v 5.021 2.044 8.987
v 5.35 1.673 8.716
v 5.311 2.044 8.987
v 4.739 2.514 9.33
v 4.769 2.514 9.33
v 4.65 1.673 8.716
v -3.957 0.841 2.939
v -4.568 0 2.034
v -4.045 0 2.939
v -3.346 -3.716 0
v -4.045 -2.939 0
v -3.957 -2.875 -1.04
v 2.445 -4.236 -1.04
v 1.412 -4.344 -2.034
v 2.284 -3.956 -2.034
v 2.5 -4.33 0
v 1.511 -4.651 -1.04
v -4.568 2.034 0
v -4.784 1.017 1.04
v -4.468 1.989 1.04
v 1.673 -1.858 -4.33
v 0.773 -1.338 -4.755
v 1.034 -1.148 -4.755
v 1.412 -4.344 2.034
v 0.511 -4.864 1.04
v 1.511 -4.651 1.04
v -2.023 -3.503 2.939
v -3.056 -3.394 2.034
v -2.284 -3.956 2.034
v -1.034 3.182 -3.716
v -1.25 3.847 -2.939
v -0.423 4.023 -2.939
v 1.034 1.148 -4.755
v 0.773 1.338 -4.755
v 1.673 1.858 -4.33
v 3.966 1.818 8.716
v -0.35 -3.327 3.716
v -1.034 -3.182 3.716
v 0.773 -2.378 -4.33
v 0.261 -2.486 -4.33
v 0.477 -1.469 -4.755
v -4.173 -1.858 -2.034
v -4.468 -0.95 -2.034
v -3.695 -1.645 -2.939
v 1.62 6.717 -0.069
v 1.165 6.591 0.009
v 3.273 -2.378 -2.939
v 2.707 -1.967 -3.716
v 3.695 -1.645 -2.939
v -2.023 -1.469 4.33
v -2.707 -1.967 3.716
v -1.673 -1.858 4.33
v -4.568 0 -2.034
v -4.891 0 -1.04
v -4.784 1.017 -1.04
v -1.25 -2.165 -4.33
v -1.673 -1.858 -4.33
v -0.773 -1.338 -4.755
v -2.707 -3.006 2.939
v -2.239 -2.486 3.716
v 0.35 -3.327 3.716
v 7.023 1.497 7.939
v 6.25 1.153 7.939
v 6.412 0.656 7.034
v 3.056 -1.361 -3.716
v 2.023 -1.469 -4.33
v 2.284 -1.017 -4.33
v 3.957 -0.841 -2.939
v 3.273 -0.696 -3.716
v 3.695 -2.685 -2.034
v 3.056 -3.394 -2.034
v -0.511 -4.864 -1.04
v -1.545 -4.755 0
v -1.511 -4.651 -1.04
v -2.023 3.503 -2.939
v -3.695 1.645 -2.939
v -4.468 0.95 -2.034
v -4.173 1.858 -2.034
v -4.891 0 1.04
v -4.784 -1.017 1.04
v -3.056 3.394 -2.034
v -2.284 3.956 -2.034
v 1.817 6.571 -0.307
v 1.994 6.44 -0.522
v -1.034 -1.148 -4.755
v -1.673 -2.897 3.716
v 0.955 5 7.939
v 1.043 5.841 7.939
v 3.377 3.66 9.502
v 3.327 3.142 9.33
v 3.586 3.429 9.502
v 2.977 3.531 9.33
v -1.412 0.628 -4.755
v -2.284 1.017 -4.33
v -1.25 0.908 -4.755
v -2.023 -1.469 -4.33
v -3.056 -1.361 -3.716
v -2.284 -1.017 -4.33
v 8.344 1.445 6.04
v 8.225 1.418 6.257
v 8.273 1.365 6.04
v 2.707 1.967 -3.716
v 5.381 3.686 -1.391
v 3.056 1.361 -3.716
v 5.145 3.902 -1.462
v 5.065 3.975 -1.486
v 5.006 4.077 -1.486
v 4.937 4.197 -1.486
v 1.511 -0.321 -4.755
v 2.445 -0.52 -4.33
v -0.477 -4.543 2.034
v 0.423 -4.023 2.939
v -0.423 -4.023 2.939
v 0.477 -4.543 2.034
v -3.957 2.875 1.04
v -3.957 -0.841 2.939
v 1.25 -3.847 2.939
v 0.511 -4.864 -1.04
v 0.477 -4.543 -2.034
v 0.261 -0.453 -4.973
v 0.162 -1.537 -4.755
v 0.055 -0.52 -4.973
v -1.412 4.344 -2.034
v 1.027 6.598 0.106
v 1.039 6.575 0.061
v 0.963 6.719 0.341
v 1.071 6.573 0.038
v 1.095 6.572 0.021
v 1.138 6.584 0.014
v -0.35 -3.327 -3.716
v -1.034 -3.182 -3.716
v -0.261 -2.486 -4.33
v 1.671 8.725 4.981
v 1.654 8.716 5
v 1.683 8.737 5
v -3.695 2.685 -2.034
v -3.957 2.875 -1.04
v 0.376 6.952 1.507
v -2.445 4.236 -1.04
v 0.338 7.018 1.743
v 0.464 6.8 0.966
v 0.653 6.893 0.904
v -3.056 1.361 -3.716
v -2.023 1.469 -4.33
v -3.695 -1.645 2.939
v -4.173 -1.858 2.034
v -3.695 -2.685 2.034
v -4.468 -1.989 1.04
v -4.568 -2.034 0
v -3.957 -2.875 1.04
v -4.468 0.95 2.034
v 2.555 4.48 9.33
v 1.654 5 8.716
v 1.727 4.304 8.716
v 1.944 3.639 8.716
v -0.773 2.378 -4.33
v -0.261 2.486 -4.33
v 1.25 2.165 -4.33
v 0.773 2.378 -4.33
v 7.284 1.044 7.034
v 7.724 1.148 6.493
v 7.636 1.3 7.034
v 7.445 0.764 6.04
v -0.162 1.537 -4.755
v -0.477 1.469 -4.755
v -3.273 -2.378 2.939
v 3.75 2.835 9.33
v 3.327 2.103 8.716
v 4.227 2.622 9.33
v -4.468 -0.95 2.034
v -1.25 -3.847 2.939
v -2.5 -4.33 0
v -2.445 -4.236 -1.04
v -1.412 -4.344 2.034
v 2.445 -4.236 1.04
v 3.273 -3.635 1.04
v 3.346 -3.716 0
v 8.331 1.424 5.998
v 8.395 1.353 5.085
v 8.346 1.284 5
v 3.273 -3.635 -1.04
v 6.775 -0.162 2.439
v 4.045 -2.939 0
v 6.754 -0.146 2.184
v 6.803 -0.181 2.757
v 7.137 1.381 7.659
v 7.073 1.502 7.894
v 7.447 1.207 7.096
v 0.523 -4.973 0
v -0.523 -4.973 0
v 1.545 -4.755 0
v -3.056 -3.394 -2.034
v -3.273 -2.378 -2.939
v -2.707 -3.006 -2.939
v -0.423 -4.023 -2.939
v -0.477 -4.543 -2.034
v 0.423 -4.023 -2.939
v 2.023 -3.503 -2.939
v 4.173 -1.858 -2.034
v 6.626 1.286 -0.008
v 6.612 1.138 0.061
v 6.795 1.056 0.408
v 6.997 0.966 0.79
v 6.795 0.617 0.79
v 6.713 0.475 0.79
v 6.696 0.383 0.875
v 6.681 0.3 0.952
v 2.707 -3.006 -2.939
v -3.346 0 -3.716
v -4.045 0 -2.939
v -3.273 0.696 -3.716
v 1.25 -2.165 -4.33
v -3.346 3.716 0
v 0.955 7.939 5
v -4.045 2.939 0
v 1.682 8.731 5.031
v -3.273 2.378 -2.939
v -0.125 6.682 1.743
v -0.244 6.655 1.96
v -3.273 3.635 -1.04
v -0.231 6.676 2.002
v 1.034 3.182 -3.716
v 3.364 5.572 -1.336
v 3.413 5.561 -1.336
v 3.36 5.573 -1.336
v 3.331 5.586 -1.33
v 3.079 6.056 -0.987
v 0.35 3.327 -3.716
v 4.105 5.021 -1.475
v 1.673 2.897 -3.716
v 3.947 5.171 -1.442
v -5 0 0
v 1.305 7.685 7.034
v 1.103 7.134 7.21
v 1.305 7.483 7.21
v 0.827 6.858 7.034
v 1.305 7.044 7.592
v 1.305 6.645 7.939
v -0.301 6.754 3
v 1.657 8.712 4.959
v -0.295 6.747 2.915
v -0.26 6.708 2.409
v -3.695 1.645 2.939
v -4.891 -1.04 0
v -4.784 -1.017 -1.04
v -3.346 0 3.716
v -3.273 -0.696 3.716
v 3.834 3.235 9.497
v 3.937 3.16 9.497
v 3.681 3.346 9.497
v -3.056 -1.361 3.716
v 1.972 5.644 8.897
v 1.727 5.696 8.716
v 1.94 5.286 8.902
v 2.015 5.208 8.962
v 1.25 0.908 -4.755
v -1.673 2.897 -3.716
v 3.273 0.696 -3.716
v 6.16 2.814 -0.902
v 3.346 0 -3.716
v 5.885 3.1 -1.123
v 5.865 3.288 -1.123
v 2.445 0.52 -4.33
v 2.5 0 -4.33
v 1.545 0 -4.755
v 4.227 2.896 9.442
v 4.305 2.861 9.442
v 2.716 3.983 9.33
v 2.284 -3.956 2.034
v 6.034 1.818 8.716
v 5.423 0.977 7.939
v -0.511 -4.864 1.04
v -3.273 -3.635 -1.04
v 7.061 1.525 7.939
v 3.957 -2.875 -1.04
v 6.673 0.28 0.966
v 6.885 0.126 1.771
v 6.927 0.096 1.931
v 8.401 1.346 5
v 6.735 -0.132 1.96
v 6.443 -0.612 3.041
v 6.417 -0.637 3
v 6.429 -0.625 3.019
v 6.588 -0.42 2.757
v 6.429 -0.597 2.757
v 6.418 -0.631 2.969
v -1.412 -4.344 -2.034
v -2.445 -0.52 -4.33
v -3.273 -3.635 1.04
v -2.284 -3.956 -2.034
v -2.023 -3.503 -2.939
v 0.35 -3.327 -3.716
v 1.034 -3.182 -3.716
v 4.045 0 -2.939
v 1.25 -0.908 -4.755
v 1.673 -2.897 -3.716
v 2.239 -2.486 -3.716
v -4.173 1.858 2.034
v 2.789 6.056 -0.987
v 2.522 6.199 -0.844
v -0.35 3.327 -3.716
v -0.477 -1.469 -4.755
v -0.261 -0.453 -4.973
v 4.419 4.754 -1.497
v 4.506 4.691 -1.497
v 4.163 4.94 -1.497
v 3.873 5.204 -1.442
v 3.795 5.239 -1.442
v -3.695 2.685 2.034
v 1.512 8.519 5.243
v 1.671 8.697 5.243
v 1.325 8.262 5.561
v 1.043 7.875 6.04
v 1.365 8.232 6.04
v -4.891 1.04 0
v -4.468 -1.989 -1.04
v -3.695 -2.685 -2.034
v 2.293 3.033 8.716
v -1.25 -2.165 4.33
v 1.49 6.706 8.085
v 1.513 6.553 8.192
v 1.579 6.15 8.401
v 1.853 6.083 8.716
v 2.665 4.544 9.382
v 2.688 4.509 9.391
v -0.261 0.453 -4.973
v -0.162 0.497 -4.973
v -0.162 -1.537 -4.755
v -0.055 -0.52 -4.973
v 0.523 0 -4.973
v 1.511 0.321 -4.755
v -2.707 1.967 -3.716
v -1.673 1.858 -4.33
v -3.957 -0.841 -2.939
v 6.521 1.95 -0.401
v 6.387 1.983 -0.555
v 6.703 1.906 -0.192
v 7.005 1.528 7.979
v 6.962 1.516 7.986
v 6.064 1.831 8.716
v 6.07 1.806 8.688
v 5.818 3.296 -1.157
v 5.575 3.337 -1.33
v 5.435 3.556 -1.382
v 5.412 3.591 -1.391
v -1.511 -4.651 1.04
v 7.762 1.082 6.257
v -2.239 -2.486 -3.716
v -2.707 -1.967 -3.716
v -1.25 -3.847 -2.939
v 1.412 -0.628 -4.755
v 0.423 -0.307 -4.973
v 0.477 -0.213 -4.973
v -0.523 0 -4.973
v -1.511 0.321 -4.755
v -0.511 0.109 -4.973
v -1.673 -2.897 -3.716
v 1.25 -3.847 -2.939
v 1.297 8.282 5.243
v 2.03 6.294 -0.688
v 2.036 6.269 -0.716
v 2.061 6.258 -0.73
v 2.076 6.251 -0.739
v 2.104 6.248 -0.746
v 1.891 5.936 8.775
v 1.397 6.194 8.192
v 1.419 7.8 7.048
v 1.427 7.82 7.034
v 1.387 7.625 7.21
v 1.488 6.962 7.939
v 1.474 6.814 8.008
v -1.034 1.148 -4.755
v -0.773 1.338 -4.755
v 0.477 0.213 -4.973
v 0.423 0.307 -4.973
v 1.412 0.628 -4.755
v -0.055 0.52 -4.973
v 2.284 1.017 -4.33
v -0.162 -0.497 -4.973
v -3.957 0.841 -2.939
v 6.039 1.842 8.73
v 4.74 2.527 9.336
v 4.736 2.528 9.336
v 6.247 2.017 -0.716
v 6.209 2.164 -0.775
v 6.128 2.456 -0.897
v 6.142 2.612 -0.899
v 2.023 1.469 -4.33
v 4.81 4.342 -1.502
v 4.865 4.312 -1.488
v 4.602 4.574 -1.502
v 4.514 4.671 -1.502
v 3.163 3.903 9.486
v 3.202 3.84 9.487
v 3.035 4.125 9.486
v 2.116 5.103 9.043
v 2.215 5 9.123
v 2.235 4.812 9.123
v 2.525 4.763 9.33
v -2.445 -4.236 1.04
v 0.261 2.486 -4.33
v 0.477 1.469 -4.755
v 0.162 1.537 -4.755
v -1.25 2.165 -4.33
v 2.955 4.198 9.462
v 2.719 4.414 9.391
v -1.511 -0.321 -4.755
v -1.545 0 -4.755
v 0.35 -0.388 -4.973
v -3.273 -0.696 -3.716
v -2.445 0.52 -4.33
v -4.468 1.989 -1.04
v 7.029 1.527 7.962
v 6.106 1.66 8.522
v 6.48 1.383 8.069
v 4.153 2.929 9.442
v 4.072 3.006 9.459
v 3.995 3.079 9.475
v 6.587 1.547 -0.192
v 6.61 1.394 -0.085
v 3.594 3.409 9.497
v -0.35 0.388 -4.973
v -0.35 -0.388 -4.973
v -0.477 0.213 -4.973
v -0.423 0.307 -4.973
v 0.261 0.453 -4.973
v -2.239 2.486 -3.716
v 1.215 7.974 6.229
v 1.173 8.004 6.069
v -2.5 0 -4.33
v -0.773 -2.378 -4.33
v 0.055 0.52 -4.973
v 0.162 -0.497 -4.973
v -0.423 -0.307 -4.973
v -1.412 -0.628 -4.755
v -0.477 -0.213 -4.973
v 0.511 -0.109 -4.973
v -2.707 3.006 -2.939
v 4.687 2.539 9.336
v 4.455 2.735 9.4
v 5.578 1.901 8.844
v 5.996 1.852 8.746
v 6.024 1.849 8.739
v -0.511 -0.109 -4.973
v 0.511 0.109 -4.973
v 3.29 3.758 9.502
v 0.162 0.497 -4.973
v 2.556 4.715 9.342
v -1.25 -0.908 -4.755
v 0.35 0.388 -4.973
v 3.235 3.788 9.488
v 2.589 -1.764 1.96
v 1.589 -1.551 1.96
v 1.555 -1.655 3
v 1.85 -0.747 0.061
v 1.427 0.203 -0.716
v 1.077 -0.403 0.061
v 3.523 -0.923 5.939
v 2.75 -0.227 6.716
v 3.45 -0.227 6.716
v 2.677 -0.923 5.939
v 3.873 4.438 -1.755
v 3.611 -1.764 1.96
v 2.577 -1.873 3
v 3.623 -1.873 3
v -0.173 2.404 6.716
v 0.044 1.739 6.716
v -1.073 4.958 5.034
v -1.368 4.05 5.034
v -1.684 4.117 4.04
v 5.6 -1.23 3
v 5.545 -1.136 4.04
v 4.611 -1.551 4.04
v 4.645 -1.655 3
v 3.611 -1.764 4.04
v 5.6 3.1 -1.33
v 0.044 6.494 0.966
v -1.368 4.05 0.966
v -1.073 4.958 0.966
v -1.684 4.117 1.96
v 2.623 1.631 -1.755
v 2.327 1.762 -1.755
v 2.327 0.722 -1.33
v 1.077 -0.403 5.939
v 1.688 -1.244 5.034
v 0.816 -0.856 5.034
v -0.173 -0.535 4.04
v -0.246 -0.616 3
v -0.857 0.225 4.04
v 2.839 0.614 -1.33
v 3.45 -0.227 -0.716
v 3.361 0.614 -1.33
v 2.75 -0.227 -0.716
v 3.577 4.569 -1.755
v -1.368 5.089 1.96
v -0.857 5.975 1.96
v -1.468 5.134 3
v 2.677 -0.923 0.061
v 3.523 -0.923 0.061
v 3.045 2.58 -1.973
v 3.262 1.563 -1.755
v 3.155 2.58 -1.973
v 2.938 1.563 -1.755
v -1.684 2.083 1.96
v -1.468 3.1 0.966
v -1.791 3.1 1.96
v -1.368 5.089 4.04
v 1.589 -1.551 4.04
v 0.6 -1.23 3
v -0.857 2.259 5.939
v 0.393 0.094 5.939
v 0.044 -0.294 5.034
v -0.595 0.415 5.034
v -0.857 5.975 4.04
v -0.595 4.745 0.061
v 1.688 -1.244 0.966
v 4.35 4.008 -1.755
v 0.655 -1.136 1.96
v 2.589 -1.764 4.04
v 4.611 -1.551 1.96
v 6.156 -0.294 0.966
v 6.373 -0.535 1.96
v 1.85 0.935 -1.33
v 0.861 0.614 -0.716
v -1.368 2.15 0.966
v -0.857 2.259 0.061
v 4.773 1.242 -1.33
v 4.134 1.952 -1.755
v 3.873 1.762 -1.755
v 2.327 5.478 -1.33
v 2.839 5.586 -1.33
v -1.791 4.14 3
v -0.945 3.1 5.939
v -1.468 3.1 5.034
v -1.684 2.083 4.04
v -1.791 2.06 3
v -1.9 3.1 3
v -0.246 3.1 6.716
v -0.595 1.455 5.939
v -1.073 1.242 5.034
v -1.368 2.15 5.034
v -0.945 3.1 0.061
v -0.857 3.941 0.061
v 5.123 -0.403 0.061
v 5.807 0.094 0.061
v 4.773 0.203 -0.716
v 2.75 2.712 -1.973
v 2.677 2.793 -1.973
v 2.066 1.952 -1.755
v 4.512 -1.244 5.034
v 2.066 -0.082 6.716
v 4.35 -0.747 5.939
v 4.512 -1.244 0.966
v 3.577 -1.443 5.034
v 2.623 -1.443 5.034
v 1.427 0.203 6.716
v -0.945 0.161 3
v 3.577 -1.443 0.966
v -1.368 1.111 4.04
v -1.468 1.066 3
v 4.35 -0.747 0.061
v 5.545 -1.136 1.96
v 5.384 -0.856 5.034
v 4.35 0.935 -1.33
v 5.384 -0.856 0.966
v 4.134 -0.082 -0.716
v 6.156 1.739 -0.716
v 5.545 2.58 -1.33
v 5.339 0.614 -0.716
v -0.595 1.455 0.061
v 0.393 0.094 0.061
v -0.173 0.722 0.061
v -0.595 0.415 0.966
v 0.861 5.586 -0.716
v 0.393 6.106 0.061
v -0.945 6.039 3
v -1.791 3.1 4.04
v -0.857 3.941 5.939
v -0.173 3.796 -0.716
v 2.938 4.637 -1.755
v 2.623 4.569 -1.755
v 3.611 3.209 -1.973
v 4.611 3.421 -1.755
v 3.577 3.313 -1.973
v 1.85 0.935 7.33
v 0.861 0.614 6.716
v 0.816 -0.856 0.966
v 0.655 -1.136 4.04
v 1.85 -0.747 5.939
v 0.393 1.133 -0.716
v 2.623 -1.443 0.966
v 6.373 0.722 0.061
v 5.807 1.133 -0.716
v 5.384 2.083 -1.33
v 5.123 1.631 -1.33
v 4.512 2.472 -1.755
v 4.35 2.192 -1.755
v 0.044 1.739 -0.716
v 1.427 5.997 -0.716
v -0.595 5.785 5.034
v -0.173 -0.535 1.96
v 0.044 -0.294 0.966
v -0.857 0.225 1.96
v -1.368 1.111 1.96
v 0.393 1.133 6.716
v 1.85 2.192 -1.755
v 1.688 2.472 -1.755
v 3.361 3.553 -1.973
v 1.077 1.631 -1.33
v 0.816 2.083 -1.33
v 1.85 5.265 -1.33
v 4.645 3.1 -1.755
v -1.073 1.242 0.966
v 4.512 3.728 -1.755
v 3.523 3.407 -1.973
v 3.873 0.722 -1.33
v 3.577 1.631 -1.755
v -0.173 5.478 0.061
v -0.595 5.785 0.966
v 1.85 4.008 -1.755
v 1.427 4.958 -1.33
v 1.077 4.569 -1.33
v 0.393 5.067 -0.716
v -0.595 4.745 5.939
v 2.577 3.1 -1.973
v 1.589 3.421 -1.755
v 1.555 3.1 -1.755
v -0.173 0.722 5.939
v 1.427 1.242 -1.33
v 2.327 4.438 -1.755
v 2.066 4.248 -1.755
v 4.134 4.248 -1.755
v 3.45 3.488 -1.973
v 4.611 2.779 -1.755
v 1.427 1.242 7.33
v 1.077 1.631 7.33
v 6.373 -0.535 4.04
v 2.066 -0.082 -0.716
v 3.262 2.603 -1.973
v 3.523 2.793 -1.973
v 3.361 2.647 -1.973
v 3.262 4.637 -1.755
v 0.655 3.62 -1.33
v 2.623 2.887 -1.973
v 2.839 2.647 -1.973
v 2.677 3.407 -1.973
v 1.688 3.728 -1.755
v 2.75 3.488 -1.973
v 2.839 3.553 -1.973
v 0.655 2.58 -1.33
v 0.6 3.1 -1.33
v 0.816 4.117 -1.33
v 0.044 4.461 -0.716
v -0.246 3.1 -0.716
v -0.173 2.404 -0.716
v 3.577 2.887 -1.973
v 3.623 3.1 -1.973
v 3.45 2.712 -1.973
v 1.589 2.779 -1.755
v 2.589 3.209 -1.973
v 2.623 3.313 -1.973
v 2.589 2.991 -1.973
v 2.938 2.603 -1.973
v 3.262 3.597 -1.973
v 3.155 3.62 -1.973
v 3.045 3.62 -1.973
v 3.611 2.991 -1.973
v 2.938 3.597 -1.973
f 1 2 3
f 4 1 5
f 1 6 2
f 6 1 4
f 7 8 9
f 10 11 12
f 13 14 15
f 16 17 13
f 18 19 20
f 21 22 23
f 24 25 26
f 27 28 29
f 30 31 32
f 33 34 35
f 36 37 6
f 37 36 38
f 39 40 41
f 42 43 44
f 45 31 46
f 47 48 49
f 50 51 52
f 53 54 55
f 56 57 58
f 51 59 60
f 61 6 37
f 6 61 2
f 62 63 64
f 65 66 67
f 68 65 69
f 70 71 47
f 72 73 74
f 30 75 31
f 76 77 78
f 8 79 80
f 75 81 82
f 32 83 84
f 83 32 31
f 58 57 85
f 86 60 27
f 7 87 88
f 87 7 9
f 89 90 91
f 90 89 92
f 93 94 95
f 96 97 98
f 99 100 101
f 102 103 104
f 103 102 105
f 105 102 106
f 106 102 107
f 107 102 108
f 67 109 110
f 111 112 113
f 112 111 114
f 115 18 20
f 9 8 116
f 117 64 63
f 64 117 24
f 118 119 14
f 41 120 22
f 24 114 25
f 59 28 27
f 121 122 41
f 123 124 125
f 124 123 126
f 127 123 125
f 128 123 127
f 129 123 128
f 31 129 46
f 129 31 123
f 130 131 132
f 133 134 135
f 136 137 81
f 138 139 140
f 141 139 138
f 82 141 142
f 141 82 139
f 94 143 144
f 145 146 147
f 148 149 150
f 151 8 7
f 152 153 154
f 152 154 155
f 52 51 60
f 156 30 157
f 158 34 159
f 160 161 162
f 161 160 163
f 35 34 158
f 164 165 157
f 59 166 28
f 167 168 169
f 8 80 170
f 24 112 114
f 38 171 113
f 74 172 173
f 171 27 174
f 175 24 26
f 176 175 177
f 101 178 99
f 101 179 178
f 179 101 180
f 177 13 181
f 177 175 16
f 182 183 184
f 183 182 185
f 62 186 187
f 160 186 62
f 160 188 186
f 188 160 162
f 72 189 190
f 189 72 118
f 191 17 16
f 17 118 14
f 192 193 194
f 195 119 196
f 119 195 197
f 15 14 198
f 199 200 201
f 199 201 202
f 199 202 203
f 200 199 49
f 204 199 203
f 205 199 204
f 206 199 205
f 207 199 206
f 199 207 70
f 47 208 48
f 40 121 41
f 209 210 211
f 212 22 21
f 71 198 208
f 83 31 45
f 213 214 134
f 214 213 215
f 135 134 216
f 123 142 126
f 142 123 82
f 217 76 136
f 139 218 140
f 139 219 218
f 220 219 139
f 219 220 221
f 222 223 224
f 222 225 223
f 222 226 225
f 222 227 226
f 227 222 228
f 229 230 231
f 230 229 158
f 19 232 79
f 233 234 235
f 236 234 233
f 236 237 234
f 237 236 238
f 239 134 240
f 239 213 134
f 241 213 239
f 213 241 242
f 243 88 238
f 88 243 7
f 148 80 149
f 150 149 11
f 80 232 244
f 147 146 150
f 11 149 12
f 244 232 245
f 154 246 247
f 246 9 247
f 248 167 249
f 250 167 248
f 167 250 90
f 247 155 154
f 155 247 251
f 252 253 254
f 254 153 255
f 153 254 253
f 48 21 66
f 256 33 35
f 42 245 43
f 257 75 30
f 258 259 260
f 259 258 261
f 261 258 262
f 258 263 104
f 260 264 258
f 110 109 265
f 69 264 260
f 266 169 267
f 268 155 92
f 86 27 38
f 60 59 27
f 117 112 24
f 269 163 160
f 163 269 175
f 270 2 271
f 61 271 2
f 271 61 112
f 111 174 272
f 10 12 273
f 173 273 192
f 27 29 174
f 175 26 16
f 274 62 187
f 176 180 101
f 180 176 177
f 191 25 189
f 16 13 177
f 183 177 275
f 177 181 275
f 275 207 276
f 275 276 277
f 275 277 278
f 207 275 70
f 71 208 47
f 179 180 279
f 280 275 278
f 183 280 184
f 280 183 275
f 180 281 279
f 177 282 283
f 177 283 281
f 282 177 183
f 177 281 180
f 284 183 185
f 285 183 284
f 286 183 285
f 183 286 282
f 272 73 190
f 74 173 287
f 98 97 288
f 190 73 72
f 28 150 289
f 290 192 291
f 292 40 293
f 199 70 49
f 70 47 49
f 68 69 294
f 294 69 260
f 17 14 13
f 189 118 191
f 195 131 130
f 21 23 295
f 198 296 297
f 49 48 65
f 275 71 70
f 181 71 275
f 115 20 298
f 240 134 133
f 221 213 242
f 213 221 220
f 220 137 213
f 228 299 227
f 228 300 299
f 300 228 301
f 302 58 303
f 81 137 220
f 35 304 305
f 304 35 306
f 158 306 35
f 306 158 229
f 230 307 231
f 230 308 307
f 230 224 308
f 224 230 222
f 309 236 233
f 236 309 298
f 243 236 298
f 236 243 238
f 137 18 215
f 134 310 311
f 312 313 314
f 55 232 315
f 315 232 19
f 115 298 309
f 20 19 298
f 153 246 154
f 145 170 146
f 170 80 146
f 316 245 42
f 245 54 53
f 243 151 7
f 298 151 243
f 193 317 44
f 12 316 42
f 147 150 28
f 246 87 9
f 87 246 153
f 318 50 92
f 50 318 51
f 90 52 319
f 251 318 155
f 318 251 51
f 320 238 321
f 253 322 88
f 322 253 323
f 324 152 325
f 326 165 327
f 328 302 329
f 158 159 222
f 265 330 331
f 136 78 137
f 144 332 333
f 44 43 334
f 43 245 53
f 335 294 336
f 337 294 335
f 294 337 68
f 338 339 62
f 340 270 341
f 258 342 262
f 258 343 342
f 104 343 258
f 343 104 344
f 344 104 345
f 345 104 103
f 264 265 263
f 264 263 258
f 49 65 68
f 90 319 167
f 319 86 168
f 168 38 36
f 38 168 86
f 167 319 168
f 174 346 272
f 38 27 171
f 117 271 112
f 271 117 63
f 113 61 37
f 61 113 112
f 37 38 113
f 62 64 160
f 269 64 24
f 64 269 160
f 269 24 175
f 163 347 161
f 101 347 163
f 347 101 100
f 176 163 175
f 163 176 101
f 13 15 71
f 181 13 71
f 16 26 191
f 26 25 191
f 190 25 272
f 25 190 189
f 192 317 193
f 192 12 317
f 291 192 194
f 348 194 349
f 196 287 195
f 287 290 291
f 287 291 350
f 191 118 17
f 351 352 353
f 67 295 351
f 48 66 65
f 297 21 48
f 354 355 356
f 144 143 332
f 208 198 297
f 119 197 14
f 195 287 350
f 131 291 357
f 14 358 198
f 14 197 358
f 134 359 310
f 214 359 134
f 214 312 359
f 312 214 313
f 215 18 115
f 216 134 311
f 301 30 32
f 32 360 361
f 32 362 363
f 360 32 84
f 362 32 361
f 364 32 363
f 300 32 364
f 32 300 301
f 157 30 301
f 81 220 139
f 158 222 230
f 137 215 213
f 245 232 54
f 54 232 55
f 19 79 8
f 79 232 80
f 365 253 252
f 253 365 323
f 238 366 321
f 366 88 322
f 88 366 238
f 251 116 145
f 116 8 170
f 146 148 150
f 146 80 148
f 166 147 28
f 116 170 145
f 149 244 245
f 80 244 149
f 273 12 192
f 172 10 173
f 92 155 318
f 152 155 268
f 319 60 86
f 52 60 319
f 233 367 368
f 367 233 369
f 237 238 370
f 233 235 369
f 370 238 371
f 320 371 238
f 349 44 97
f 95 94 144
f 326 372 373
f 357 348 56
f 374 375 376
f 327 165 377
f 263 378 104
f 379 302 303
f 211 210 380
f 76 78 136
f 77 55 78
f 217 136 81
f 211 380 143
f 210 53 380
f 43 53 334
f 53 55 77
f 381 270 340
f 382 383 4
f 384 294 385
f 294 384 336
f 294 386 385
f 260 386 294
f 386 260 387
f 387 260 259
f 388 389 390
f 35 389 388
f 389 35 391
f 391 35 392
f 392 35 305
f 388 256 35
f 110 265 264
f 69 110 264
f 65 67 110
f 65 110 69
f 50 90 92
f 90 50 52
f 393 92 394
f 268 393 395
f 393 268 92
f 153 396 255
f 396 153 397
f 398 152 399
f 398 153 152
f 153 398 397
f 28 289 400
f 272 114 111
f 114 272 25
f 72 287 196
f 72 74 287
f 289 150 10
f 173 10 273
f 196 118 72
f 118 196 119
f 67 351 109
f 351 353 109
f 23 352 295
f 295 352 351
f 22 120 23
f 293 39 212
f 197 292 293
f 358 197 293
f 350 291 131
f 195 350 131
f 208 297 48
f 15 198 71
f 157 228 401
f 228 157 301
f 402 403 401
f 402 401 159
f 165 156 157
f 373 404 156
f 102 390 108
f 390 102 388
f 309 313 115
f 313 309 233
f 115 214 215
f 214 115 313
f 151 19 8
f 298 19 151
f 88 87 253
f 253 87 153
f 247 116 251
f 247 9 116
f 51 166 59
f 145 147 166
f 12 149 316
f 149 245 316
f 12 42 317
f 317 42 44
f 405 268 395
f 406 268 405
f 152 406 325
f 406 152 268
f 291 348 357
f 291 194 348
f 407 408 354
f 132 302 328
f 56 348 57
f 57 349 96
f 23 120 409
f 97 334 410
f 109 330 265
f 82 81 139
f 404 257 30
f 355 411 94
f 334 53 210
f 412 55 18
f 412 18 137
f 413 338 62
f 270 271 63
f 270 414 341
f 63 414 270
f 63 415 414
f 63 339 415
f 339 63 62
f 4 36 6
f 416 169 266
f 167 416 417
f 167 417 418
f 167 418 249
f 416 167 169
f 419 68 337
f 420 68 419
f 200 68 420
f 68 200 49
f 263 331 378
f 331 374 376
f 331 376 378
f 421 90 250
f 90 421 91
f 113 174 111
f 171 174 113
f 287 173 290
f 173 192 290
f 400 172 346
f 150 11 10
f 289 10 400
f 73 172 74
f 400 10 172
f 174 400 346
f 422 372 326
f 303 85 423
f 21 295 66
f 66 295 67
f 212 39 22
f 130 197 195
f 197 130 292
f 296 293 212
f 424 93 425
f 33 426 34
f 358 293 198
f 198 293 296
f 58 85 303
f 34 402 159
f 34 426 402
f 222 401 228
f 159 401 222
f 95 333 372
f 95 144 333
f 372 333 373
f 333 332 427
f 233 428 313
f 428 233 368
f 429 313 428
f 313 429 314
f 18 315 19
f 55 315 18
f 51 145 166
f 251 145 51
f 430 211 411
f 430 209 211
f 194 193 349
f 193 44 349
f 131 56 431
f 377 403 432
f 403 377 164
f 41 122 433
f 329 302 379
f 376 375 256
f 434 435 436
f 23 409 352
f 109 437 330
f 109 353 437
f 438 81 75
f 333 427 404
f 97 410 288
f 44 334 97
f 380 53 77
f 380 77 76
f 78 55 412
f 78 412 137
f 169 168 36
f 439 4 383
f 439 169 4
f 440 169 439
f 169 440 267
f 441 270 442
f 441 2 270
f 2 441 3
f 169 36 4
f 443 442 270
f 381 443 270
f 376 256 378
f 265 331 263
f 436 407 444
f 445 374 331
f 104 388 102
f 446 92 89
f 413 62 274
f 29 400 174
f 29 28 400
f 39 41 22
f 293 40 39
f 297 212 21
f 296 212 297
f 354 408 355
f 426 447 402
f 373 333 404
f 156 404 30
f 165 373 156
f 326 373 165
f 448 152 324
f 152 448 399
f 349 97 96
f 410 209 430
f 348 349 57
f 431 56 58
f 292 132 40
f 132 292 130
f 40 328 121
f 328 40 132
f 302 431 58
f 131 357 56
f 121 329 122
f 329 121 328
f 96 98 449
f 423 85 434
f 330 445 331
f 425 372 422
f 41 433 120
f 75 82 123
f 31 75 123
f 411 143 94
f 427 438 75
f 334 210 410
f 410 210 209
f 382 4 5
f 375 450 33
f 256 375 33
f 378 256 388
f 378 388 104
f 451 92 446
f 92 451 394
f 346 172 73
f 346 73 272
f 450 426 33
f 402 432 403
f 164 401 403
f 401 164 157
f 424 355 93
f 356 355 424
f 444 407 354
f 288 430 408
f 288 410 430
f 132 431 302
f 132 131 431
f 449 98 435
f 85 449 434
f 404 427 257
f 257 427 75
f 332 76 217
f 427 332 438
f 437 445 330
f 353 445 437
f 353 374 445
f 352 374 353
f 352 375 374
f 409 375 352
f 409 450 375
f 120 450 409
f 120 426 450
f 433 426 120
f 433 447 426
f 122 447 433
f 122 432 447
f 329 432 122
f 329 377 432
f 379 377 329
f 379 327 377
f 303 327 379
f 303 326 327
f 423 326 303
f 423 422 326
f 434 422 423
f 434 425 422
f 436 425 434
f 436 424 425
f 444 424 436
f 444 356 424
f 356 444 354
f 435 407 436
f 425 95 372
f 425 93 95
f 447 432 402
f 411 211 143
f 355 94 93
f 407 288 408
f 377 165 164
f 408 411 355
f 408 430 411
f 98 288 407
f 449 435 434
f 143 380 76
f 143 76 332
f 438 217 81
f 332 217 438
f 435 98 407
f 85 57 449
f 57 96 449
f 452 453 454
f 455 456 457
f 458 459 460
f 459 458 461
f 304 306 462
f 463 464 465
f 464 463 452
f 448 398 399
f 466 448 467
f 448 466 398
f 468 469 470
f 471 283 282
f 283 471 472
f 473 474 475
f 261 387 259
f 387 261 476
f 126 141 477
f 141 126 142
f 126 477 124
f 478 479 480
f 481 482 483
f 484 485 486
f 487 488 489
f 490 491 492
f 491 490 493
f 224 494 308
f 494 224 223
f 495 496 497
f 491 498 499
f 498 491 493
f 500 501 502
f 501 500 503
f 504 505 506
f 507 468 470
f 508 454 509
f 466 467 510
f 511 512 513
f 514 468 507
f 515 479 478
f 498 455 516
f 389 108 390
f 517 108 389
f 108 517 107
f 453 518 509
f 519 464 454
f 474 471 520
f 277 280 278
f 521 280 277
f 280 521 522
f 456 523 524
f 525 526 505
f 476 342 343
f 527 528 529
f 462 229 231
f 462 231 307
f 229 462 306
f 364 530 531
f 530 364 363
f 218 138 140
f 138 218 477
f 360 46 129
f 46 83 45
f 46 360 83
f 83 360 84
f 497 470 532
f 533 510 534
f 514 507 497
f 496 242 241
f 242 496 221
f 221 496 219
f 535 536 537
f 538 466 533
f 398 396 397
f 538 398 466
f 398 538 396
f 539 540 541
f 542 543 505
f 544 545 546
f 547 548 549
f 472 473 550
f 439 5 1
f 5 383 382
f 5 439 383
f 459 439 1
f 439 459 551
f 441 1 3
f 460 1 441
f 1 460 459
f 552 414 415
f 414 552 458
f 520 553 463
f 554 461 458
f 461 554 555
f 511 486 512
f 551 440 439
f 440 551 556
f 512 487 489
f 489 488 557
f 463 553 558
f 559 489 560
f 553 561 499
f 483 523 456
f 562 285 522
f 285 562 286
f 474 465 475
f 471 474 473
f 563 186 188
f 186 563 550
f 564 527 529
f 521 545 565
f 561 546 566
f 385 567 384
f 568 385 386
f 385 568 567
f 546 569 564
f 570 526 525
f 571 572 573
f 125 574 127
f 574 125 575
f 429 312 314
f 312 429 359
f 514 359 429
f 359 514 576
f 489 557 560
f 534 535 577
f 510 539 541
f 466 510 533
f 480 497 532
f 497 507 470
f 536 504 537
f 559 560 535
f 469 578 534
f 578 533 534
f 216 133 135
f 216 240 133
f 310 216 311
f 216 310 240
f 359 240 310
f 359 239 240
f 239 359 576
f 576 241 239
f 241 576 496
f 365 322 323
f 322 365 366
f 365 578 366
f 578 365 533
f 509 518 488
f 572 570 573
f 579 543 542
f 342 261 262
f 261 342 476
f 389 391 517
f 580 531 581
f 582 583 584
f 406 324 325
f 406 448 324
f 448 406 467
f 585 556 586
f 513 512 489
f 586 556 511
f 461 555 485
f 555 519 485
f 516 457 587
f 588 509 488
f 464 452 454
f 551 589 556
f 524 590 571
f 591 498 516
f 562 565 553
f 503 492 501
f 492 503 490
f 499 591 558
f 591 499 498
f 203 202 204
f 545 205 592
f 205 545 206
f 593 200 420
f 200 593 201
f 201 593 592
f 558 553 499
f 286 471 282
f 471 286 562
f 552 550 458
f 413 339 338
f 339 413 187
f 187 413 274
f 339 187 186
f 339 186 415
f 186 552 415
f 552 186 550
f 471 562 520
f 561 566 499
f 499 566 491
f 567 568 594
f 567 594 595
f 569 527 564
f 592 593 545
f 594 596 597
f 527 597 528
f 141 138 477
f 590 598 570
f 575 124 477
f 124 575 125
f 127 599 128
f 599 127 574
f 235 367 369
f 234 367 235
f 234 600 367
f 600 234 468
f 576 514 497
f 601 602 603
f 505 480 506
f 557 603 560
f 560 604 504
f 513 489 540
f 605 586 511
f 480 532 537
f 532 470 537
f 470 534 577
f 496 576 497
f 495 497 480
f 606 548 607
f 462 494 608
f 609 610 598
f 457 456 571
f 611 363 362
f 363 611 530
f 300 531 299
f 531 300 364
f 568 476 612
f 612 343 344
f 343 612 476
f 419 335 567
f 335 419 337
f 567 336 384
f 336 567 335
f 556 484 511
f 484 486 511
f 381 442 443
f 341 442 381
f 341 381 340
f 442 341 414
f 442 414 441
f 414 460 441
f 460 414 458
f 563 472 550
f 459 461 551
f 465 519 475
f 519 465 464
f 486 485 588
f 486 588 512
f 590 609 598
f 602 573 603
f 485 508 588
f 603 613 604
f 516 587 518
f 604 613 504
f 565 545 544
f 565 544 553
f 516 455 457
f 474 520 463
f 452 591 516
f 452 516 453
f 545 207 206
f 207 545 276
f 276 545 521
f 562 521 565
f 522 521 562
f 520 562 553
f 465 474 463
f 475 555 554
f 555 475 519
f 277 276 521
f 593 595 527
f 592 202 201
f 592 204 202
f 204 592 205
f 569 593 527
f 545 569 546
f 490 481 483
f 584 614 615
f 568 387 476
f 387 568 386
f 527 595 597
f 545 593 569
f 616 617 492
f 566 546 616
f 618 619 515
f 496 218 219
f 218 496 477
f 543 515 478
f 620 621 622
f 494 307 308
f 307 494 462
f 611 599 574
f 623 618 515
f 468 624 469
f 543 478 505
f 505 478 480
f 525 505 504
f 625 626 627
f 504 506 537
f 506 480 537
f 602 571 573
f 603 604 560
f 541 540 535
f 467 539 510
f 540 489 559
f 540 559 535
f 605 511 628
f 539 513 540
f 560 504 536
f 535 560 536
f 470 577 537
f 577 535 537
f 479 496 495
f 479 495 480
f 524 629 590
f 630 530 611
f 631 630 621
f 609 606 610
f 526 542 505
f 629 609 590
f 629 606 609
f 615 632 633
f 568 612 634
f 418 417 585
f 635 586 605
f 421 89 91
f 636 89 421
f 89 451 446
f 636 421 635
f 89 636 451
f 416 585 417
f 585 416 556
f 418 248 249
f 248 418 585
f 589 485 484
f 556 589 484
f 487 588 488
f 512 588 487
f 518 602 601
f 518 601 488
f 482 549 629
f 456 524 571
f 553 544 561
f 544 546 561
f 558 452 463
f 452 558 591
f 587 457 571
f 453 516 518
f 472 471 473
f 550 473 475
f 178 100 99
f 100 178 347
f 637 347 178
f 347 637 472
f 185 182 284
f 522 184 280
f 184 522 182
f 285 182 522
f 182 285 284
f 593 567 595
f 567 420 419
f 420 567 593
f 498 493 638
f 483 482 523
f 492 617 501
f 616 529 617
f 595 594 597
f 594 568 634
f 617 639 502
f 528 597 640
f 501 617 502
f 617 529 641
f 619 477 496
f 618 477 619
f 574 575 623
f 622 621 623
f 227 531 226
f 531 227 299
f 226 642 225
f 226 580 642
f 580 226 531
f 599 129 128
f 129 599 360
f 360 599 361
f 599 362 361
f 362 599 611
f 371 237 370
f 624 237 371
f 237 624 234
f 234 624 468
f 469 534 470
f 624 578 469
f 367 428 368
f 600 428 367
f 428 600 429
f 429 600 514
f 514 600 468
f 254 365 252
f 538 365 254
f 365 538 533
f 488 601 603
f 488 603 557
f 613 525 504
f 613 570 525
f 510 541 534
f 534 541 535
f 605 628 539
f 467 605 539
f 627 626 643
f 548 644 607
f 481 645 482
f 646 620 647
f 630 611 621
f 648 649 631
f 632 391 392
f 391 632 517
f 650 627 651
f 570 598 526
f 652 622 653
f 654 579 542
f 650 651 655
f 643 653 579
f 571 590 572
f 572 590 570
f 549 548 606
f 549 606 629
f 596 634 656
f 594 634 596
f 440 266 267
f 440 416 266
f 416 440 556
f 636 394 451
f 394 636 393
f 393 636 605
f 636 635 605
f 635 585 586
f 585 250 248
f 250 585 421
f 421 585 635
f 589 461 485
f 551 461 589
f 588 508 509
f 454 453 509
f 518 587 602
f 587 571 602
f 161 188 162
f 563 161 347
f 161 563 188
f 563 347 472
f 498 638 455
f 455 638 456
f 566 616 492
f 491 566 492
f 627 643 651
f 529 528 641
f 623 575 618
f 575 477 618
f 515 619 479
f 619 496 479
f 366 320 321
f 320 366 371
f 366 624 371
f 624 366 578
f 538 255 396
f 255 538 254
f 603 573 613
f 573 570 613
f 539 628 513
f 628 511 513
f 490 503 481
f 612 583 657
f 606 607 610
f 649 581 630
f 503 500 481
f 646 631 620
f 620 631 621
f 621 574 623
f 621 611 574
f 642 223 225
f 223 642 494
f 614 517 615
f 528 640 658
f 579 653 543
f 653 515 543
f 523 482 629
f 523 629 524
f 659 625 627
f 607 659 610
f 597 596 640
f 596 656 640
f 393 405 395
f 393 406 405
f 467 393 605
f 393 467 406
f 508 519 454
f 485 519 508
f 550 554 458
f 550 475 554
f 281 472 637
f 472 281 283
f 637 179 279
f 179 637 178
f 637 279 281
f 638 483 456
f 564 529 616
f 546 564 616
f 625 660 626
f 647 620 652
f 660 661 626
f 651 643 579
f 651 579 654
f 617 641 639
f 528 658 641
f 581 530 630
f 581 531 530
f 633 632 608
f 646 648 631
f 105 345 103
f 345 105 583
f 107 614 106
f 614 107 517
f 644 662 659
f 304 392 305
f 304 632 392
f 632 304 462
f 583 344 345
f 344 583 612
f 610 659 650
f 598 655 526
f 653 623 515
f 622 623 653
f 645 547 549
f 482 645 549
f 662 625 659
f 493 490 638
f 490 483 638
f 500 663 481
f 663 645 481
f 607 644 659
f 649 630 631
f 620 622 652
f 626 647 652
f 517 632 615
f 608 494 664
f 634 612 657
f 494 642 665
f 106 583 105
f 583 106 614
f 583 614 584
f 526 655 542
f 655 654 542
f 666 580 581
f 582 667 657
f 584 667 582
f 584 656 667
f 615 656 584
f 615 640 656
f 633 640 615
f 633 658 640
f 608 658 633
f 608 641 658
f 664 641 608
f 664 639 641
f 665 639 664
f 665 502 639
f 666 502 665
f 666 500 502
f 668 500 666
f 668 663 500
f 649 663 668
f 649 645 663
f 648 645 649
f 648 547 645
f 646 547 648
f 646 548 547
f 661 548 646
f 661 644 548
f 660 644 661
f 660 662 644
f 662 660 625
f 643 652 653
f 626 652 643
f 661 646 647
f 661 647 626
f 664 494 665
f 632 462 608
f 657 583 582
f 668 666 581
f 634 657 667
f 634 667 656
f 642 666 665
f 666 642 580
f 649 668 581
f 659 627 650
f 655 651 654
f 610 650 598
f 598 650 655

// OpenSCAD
// file: ../../modules/scad/roundedcube.scad
// More information: https://danielupshaw.com/openscad-rounded-corners/


// Examples
// color("Yellow")
// roundedcube(3, true, 0.7, "xmin");

// translate(v = [1, 0, 2])
// color("Pink")
// roundedcube([4, 2, 2], false, 0.6, "zmax");

// translate(v = [-4, -1, 2])
// color("Lightblue")
// roundedcube(2, false);

// translate(v = [0, 0, 6])
// color("Orange")
// roundedcube([3, 2, 2], true, 0.2);

// translate(v = [2.5, -0.5, 5])
// color("Green")
// roundedcube([3, 2, 2], false, 0.4, "z");

// Set to 0.01 for higher definition curves (renders slower)
$fs = 0.15;

module roundedcube(size = [1, 1, 1], center = false, radius = 0.5, apply_to = "all") {
	// If single value, convert to [x, y, z] vector
	size = (size[0] == undef) ? [size, size, size] : size;

	translate_min = radius;
	translate_xmax = size[0] - radius;
	translate_ymax = size[1] - radius;
	translate_zmax = size[2] - radius;

	diameter = radius * 2;

	obj_translate = (center == false) ?
		[0, 0, 0] : [
			-(size[0] / 2),
			-(size[1] / 2),
			-(size[2] / 2)
		];

	translate(v = obj_translate) {
		hull() {
			for (translate_x = [translate_min, translate_xmax]) {
				x_at = (translate_x == translate_min) ? "min" : "max";
				for (translate_y = [translate_min, translate_ymax]) {
					y_at = (translate_y == translate_min) ? "min" : "max";
					for (translate_z = [translate_min, translate_zmax]) {
						z_at = (translate_z == translate_min) ? "min" : "max";

						translate(v = [translate_x, translate_y, translate_z])
						if (
							(apply_to == "all") ||
							(apply_to == "xmin" && x_at == "min") || (apply_to == "xmax" && x_at == "max") ||
							(apply_to == "ymin" && y_at == "min") || (apply_to == "ymax" && y_at == "max") ||
							(apply_to == "zmin" && z_at == "min") || (apply_to == "zmax" && z_at == "max")
						) {
							sphere(r = radius);
						} else {
							rotate = 
								(apply_to == "xmin" || apply_to == "xmax" || apply_to == "x") ? [0, 90, 0] : (
								(apply_to == "ymin" || apply_to == "ymax" || apply_to == "y") ? [90, 90, 0] :
								[0, 0, 0]
							);
							rotate(a = rotate)
							cylinder(h = diameter, r = radius, center = true);
						}
					}
				}
			}
		}
	}
}
// main file
use <./../../modules/scad/roundedcube.scad>

_box_width = 160;
_box_depth = 160;
_box_height = 50;
_thickness = 3;
_box_radius = 5; 

module box_base(_w, _d, _h, _t, _r) {
    difference() {
        roundedcube(size = [_w, _d, _h], center = false, radius = _r, "z");
        translate([_t, _t, _t])
        roundedcube(size = [_w - _t * 2, _d - _t * 2, _h], center = false, radius = _r, "z");
    }
}

module lid_base(_w, _d, _h, _t, _r) {
    difference() {
        roundedcube(size = [_w + _t * 2, _d + _t * 2, _t * 2], center = false, radius = _r, "z");
        translate([_t + 0.1, _t + 0.1, _t])
        roundedcube(size = [_w + 0.2, _d + 0.2, _h], center = false, radius = _r, "z");
    }
}


module fusable_nuts_holder(_h) {
    difference() {
        cylinder(h = _h, r = 5);
        translate([0, 0, -1])
        cylinder(h = _h + 2, r = 2.5);
    }
}

module box(_w, _d, _h, _t, _r) {
    difference() {

        union() {
            box_base(_w, _d, _h, _t, _r);

            color("pink") {
                // Fusable nuts holder in den 4 Ecken
                translate([7, 7, 0]) fusable_nuts_holder(_h); // ul
                translate([_w - 7, 7, 0]) fusable_nuts_holder(_h); // ur
                translate([_w - 7, _d - 7, 0]) fusable_nuts_holder(_h); // or
                translate([7, _box_depth - 7, 0]) fusable_nuts_holder(_box_height); // ol

                // Fusable nuts holder mittig an den 4 Seiten
                translate([_w / 2, 7, 0]) fusable_nuts_holder(_h); // u
                translate([_w - 7, _d / 2, 0]) fusable_nuts_holder(_h); // r
                translate([_w / 2, _d - 7, 0]) fusable_nuts_holder(_h); // o
                translate([7, _d / 2, 0]) fusable_nuts_holder(_h); // l
            }
        }

        // Loch für Kabeldurchführung unten rechts 1 (Netzteil 1)
        translate([_w - _t - 1, 27, _h / 2])
        rotate([90, 0, 90])
        cylinder(h = _t + 2, d = 16);

        // Loch für Kabeldurchführung unten rechts 2 (Netzteil 1)
        translate([_w - _t - 1, _d / 2 - 19, _h / 2])
        rotate([90, 0, 90])
        cylinder(h = _t + 2, d = 16);

        // Loch für Kabeldurchführung unten rechts 3 (leer)
        translate([_w - _t - 1, _d / 2 + 19, _h / 2])
        rotate([90, 0, 90])
        cylinder(h = _t + 2, d = 16);

        // Loch für Kabeldurchführung unten rechts 4 (leer)
        translate([_w - _t - 1, _d - 27, _h / 2])
        rotate([90, 0, 90])
        cylinder(h = _t + 2, d = 16);

        // Loch für Kabeldurchführung oben links (Steckdose)
        translate([27, _d + 1, _h / 2])
        rotate([90, 0, 0])
        cylinder(h = _t + 2, d = 16);

        // Loch für Kabeldurchführung oben links (leer)
        translate([_w / 2 - 19, _d + 1, _h / 2])
        rotate([90, 0, 0])
        cylinder(h = _t + 2, d = 16);

        // Loch für Kabeldurchführung oben links (leer)
        translate([_w / 2 + 19, _d + 1, _h / 2])
        rotate([90, 0, 0])
        cylinder(h = _t + 2, d = 16);

        // Loch für Kabeldurchführung oben links (leer)
        translate([_w - 27, _d + 1, _h / 2])
        rotate([90, 0, 0])
        cylinder(h = _t + 2, d = 16);

        // Loch für Kabeldurchführung unten (Zuleitung)
        translate([50, _d / 2, -1])
        rotate([0, 0, 0])
        cylinder(h = _t + 2, d = 20);
    }
}

module lid(_w, _d, _h, _t, _r) {

    difference() {
        lid_base(_w, _d, _h, _t, _r);

        // Srew holes in corners
        color("Red")
        translate([_thickness + 7, _thickness + 7, -10]) cylinder(h = _t + 20, r = 2.5); // ul
        translate([_w - 7 + _thickness, _thickness + 7, -10]) cylinder(h = _t + 20, r = 2.5); // ur
        translate([_w - 7 + _thickness, _d - 7 + _thickness, -10]) cylinder(h = _t + 20, r = 2.5); // or
        translate([7 + _thickness, _box_depth - 7 + _thickness, -10]) cylinder(h = _t + 20, r = 2.5); // ol

        // Screw holes at the sides
        translate([_w / 2 + _thickness, 7 + _thickness, -10]) cylinder(h = _t + 20, r = 2.5); // u
        translate([_w - 7 + _thickness, _d / 2 + _thickness, -10]) cylinder(h = _t + 20, r = 2.5); // r
        translate([_w / 2 + _thickness, _d - 7 + _thickness, -10]) cylinder(h = _t + 20, r = 2.5); // o
        translate([7 + _thickness, _d / 2 + _thickness, -10]) cylinder(h = _t + 20, r = 2.5); // l

    }
}


// translate([_box_width +_thickness, - _thickness, 60])
// rotate([0, 180, 0])
lid(_box_width, _box_depth, _box_height, _thickness, _box_radius);
//box(_box_width, _box_depth, _box_height, _thickness, _box_radius);
